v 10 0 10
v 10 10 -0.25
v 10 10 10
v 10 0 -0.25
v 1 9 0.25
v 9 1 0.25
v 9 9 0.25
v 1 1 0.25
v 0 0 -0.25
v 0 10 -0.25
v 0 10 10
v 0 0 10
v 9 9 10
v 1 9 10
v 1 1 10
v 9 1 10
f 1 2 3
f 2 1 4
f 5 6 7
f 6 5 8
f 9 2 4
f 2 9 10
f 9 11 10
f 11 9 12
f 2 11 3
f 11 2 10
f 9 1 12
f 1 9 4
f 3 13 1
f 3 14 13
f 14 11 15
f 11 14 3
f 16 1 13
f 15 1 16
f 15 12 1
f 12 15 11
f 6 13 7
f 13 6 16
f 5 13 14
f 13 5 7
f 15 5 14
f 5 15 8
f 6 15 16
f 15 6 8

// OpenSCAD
module makeRoom(cube_size) {
    translate([cube_size / 2, cube_size / 2 , 0])
    cube([cube_size, cube_size, 0.5], center = true);
    translate([cube_size - 1, 0, 0])
    cube([1, cube_size, cube_size]);
    translate([0, cube_size - 1, 0])
    cube([cube_size, 1, cube_size]);
    cube([1, cube_size, cube_size]);
    cube([cube_size, 1, cube_size]);
}
makeRoom(10);
